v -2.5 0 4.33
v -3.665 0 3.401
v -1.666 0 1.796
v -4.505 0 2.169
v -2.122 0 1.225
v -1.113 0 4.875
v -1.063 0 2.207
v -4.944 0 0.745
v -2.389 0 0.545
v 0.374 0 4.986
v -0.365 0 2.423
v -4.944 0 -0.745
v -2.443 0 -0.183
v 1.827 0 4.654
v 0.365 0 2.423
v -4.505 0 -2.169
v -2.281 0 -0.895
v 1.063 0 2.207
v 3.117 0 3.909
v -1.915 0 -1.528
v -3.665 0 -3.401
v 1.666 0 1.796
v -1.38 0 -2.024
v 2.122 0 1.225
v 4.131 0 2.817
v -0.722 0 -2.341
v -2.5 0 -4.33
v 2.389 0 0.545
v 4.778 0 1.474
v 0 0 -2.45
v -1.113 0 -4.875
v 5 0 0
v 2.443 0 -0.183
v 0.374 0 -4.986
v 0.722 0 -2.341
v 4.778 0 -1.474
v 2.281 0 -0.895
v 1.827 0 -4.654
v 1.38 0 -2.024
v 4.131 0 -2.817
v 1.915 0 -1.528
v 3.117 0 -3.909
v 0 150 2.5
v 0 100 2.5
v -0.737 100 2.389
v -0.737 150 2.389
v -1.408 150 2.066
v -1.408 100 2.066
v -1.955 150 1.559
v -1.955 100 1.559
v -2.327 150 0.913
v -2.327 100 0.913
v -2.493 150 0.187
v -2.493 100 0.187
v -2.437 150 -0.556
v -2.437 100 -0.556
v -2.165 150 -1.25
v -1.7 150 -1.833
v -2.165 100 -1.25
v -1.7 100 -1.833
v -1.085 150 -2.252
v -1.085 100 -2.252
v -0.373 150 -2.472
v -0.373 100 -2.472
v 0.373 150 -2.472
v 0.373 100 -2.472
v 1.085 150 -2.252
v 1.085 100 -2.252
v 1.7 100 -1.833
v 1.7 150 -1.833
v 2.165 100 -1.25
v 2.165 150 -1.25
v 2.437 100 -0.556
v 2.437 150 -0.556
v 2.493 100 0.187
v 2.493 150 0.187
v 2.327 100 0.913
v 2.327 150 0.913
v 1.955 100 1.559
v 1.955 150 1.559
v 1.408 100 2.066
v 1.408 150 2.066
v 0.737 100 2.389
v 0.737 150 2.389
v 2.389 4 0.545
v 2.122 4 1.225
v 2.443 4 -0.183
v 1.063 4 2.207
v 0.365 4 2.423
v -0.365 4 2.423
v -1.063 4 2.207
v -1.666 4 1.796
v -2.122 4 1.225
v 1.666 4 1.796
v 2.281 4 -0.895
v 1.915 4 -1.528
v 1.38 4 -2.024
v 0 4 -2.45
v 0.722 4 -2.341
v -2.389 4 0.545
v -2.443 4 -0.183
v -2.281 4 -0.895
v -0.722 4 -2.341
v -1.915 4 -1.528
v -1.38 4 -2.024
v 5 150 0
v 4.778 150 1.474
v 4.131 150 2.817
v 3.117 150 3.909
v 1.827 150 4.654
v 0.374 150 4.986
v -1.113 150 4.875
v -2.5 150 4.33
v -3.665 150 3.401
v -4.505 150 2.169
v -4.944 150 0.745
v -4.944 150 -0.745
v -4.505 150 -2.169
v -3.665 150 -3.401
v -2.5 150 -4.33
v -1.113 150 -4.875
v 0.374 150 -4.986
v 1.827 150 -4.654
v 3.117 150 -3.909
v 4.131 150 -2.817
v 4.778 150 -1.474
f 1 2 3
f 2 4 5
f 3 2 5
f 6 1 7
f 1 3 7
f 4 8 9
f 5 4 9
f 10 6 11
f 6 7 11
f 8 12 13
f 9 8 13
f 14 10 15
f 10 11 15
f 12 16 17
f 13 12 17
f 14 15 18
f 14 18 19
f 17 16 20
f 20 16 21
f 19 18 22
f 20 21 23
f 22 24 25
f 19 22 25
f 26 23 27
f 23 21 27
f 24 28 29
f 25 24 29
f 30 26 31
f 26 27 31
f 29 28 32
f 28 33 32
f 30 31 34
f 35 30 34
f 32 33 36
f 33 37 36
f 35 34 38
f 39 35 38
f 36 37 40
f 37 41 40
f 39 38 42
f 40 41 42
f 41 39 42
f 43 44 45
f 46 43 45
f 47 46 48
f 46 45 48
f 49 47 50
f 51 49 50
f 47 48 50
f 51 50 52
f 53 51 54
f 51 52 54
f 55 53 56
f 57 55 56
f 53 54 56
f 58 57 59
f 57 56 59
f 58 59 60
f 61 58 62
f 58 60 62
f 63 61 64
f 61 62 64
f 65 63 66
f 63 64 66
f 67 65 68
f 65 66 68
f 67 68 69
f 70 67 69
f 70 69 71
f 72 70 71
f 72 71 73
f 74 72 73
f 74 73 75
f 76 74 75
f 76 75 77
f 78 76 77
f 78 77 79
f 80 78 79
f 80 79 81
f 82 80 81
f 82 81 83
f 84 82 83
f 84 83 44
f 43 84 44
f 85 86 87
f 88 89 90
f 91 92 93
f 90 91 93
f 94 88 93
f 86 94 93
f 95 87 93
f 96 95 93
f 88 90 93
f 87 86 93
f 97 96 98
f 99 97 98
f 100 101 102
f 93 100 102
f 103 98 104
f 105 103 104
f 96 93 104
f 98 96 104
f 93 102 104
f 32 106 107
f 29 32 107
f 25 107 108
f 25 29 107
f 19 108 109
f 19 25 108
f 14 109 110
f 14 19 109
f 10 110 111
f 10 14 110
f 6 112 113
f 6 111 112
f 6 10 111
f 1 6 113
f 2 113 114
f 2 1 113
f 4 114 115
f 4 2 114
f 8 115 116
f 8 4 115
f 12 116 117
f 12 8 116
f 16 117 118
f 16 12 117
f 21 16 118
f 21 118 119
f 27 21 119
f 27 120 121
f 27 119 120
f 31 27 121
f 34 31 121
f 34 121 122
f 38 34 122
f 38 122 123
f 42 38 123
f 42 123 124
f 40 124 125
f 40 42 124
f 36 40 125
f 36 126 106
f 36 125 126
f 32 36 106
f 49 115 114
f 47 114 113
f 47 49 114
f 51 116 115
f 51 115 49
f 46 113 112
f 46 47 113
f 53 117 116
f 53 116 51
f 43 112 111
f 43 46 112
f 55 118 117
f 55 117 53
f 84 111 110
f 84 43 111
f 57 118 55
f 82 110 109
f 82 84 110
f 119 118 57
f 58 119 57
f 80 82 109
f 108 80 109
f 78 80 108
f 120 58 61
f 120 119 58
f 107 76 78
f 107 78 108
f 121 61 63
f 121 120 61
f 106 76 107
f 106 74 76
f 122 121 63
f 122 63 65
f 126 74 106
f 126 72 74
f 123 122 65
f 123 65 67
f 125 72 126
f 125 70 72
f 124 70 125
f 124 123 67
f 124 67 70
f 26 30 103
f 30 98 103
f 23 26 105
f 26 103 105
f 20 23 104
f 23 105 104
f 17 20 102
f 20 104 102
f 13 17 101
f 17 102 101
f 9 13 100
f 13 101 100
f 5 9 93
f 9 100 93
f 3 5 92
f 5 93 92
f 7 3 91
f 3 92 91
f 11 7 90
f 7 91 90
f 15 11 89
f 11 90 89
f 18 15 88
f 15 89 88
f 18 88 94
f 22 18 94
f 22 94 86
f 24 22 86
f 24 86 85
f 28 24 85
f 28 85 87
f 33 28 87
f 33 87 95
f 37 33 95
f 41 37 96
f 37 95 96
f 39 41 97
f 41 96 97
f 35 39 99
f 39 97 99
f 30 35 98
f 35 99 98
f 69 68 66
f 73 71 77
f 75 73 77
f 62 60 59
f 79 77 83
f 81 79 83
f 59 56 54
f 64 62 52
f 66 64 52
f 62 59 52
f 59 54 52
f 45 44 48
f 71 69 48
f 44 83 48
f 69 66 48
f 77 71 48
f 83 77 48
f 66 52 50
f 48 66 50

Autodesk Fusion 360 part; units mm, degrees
sketch "Sketch1" plane through (0, 0, 0) normal (0, 1, 0) x (1, 0, 0)
sketch "Sketch2" plane through (0, 0, 0) normal (0, 1, 0) x (1, 0, 0)
  circle A0 centre (0, 0) radius 5
  dimension "d21" = 10
extrude "Extrude3" add sketch "Sketch2" along normal blind 150
hole "Hole6" at (0, 150, 0) direction (0, -1, 0) diameter 5 depth 50 tip angle 180
hole "Hole7" at (0, 0, 0) direction (0, 1, 0) diameter 4.9 depth 4 tip angle 180
